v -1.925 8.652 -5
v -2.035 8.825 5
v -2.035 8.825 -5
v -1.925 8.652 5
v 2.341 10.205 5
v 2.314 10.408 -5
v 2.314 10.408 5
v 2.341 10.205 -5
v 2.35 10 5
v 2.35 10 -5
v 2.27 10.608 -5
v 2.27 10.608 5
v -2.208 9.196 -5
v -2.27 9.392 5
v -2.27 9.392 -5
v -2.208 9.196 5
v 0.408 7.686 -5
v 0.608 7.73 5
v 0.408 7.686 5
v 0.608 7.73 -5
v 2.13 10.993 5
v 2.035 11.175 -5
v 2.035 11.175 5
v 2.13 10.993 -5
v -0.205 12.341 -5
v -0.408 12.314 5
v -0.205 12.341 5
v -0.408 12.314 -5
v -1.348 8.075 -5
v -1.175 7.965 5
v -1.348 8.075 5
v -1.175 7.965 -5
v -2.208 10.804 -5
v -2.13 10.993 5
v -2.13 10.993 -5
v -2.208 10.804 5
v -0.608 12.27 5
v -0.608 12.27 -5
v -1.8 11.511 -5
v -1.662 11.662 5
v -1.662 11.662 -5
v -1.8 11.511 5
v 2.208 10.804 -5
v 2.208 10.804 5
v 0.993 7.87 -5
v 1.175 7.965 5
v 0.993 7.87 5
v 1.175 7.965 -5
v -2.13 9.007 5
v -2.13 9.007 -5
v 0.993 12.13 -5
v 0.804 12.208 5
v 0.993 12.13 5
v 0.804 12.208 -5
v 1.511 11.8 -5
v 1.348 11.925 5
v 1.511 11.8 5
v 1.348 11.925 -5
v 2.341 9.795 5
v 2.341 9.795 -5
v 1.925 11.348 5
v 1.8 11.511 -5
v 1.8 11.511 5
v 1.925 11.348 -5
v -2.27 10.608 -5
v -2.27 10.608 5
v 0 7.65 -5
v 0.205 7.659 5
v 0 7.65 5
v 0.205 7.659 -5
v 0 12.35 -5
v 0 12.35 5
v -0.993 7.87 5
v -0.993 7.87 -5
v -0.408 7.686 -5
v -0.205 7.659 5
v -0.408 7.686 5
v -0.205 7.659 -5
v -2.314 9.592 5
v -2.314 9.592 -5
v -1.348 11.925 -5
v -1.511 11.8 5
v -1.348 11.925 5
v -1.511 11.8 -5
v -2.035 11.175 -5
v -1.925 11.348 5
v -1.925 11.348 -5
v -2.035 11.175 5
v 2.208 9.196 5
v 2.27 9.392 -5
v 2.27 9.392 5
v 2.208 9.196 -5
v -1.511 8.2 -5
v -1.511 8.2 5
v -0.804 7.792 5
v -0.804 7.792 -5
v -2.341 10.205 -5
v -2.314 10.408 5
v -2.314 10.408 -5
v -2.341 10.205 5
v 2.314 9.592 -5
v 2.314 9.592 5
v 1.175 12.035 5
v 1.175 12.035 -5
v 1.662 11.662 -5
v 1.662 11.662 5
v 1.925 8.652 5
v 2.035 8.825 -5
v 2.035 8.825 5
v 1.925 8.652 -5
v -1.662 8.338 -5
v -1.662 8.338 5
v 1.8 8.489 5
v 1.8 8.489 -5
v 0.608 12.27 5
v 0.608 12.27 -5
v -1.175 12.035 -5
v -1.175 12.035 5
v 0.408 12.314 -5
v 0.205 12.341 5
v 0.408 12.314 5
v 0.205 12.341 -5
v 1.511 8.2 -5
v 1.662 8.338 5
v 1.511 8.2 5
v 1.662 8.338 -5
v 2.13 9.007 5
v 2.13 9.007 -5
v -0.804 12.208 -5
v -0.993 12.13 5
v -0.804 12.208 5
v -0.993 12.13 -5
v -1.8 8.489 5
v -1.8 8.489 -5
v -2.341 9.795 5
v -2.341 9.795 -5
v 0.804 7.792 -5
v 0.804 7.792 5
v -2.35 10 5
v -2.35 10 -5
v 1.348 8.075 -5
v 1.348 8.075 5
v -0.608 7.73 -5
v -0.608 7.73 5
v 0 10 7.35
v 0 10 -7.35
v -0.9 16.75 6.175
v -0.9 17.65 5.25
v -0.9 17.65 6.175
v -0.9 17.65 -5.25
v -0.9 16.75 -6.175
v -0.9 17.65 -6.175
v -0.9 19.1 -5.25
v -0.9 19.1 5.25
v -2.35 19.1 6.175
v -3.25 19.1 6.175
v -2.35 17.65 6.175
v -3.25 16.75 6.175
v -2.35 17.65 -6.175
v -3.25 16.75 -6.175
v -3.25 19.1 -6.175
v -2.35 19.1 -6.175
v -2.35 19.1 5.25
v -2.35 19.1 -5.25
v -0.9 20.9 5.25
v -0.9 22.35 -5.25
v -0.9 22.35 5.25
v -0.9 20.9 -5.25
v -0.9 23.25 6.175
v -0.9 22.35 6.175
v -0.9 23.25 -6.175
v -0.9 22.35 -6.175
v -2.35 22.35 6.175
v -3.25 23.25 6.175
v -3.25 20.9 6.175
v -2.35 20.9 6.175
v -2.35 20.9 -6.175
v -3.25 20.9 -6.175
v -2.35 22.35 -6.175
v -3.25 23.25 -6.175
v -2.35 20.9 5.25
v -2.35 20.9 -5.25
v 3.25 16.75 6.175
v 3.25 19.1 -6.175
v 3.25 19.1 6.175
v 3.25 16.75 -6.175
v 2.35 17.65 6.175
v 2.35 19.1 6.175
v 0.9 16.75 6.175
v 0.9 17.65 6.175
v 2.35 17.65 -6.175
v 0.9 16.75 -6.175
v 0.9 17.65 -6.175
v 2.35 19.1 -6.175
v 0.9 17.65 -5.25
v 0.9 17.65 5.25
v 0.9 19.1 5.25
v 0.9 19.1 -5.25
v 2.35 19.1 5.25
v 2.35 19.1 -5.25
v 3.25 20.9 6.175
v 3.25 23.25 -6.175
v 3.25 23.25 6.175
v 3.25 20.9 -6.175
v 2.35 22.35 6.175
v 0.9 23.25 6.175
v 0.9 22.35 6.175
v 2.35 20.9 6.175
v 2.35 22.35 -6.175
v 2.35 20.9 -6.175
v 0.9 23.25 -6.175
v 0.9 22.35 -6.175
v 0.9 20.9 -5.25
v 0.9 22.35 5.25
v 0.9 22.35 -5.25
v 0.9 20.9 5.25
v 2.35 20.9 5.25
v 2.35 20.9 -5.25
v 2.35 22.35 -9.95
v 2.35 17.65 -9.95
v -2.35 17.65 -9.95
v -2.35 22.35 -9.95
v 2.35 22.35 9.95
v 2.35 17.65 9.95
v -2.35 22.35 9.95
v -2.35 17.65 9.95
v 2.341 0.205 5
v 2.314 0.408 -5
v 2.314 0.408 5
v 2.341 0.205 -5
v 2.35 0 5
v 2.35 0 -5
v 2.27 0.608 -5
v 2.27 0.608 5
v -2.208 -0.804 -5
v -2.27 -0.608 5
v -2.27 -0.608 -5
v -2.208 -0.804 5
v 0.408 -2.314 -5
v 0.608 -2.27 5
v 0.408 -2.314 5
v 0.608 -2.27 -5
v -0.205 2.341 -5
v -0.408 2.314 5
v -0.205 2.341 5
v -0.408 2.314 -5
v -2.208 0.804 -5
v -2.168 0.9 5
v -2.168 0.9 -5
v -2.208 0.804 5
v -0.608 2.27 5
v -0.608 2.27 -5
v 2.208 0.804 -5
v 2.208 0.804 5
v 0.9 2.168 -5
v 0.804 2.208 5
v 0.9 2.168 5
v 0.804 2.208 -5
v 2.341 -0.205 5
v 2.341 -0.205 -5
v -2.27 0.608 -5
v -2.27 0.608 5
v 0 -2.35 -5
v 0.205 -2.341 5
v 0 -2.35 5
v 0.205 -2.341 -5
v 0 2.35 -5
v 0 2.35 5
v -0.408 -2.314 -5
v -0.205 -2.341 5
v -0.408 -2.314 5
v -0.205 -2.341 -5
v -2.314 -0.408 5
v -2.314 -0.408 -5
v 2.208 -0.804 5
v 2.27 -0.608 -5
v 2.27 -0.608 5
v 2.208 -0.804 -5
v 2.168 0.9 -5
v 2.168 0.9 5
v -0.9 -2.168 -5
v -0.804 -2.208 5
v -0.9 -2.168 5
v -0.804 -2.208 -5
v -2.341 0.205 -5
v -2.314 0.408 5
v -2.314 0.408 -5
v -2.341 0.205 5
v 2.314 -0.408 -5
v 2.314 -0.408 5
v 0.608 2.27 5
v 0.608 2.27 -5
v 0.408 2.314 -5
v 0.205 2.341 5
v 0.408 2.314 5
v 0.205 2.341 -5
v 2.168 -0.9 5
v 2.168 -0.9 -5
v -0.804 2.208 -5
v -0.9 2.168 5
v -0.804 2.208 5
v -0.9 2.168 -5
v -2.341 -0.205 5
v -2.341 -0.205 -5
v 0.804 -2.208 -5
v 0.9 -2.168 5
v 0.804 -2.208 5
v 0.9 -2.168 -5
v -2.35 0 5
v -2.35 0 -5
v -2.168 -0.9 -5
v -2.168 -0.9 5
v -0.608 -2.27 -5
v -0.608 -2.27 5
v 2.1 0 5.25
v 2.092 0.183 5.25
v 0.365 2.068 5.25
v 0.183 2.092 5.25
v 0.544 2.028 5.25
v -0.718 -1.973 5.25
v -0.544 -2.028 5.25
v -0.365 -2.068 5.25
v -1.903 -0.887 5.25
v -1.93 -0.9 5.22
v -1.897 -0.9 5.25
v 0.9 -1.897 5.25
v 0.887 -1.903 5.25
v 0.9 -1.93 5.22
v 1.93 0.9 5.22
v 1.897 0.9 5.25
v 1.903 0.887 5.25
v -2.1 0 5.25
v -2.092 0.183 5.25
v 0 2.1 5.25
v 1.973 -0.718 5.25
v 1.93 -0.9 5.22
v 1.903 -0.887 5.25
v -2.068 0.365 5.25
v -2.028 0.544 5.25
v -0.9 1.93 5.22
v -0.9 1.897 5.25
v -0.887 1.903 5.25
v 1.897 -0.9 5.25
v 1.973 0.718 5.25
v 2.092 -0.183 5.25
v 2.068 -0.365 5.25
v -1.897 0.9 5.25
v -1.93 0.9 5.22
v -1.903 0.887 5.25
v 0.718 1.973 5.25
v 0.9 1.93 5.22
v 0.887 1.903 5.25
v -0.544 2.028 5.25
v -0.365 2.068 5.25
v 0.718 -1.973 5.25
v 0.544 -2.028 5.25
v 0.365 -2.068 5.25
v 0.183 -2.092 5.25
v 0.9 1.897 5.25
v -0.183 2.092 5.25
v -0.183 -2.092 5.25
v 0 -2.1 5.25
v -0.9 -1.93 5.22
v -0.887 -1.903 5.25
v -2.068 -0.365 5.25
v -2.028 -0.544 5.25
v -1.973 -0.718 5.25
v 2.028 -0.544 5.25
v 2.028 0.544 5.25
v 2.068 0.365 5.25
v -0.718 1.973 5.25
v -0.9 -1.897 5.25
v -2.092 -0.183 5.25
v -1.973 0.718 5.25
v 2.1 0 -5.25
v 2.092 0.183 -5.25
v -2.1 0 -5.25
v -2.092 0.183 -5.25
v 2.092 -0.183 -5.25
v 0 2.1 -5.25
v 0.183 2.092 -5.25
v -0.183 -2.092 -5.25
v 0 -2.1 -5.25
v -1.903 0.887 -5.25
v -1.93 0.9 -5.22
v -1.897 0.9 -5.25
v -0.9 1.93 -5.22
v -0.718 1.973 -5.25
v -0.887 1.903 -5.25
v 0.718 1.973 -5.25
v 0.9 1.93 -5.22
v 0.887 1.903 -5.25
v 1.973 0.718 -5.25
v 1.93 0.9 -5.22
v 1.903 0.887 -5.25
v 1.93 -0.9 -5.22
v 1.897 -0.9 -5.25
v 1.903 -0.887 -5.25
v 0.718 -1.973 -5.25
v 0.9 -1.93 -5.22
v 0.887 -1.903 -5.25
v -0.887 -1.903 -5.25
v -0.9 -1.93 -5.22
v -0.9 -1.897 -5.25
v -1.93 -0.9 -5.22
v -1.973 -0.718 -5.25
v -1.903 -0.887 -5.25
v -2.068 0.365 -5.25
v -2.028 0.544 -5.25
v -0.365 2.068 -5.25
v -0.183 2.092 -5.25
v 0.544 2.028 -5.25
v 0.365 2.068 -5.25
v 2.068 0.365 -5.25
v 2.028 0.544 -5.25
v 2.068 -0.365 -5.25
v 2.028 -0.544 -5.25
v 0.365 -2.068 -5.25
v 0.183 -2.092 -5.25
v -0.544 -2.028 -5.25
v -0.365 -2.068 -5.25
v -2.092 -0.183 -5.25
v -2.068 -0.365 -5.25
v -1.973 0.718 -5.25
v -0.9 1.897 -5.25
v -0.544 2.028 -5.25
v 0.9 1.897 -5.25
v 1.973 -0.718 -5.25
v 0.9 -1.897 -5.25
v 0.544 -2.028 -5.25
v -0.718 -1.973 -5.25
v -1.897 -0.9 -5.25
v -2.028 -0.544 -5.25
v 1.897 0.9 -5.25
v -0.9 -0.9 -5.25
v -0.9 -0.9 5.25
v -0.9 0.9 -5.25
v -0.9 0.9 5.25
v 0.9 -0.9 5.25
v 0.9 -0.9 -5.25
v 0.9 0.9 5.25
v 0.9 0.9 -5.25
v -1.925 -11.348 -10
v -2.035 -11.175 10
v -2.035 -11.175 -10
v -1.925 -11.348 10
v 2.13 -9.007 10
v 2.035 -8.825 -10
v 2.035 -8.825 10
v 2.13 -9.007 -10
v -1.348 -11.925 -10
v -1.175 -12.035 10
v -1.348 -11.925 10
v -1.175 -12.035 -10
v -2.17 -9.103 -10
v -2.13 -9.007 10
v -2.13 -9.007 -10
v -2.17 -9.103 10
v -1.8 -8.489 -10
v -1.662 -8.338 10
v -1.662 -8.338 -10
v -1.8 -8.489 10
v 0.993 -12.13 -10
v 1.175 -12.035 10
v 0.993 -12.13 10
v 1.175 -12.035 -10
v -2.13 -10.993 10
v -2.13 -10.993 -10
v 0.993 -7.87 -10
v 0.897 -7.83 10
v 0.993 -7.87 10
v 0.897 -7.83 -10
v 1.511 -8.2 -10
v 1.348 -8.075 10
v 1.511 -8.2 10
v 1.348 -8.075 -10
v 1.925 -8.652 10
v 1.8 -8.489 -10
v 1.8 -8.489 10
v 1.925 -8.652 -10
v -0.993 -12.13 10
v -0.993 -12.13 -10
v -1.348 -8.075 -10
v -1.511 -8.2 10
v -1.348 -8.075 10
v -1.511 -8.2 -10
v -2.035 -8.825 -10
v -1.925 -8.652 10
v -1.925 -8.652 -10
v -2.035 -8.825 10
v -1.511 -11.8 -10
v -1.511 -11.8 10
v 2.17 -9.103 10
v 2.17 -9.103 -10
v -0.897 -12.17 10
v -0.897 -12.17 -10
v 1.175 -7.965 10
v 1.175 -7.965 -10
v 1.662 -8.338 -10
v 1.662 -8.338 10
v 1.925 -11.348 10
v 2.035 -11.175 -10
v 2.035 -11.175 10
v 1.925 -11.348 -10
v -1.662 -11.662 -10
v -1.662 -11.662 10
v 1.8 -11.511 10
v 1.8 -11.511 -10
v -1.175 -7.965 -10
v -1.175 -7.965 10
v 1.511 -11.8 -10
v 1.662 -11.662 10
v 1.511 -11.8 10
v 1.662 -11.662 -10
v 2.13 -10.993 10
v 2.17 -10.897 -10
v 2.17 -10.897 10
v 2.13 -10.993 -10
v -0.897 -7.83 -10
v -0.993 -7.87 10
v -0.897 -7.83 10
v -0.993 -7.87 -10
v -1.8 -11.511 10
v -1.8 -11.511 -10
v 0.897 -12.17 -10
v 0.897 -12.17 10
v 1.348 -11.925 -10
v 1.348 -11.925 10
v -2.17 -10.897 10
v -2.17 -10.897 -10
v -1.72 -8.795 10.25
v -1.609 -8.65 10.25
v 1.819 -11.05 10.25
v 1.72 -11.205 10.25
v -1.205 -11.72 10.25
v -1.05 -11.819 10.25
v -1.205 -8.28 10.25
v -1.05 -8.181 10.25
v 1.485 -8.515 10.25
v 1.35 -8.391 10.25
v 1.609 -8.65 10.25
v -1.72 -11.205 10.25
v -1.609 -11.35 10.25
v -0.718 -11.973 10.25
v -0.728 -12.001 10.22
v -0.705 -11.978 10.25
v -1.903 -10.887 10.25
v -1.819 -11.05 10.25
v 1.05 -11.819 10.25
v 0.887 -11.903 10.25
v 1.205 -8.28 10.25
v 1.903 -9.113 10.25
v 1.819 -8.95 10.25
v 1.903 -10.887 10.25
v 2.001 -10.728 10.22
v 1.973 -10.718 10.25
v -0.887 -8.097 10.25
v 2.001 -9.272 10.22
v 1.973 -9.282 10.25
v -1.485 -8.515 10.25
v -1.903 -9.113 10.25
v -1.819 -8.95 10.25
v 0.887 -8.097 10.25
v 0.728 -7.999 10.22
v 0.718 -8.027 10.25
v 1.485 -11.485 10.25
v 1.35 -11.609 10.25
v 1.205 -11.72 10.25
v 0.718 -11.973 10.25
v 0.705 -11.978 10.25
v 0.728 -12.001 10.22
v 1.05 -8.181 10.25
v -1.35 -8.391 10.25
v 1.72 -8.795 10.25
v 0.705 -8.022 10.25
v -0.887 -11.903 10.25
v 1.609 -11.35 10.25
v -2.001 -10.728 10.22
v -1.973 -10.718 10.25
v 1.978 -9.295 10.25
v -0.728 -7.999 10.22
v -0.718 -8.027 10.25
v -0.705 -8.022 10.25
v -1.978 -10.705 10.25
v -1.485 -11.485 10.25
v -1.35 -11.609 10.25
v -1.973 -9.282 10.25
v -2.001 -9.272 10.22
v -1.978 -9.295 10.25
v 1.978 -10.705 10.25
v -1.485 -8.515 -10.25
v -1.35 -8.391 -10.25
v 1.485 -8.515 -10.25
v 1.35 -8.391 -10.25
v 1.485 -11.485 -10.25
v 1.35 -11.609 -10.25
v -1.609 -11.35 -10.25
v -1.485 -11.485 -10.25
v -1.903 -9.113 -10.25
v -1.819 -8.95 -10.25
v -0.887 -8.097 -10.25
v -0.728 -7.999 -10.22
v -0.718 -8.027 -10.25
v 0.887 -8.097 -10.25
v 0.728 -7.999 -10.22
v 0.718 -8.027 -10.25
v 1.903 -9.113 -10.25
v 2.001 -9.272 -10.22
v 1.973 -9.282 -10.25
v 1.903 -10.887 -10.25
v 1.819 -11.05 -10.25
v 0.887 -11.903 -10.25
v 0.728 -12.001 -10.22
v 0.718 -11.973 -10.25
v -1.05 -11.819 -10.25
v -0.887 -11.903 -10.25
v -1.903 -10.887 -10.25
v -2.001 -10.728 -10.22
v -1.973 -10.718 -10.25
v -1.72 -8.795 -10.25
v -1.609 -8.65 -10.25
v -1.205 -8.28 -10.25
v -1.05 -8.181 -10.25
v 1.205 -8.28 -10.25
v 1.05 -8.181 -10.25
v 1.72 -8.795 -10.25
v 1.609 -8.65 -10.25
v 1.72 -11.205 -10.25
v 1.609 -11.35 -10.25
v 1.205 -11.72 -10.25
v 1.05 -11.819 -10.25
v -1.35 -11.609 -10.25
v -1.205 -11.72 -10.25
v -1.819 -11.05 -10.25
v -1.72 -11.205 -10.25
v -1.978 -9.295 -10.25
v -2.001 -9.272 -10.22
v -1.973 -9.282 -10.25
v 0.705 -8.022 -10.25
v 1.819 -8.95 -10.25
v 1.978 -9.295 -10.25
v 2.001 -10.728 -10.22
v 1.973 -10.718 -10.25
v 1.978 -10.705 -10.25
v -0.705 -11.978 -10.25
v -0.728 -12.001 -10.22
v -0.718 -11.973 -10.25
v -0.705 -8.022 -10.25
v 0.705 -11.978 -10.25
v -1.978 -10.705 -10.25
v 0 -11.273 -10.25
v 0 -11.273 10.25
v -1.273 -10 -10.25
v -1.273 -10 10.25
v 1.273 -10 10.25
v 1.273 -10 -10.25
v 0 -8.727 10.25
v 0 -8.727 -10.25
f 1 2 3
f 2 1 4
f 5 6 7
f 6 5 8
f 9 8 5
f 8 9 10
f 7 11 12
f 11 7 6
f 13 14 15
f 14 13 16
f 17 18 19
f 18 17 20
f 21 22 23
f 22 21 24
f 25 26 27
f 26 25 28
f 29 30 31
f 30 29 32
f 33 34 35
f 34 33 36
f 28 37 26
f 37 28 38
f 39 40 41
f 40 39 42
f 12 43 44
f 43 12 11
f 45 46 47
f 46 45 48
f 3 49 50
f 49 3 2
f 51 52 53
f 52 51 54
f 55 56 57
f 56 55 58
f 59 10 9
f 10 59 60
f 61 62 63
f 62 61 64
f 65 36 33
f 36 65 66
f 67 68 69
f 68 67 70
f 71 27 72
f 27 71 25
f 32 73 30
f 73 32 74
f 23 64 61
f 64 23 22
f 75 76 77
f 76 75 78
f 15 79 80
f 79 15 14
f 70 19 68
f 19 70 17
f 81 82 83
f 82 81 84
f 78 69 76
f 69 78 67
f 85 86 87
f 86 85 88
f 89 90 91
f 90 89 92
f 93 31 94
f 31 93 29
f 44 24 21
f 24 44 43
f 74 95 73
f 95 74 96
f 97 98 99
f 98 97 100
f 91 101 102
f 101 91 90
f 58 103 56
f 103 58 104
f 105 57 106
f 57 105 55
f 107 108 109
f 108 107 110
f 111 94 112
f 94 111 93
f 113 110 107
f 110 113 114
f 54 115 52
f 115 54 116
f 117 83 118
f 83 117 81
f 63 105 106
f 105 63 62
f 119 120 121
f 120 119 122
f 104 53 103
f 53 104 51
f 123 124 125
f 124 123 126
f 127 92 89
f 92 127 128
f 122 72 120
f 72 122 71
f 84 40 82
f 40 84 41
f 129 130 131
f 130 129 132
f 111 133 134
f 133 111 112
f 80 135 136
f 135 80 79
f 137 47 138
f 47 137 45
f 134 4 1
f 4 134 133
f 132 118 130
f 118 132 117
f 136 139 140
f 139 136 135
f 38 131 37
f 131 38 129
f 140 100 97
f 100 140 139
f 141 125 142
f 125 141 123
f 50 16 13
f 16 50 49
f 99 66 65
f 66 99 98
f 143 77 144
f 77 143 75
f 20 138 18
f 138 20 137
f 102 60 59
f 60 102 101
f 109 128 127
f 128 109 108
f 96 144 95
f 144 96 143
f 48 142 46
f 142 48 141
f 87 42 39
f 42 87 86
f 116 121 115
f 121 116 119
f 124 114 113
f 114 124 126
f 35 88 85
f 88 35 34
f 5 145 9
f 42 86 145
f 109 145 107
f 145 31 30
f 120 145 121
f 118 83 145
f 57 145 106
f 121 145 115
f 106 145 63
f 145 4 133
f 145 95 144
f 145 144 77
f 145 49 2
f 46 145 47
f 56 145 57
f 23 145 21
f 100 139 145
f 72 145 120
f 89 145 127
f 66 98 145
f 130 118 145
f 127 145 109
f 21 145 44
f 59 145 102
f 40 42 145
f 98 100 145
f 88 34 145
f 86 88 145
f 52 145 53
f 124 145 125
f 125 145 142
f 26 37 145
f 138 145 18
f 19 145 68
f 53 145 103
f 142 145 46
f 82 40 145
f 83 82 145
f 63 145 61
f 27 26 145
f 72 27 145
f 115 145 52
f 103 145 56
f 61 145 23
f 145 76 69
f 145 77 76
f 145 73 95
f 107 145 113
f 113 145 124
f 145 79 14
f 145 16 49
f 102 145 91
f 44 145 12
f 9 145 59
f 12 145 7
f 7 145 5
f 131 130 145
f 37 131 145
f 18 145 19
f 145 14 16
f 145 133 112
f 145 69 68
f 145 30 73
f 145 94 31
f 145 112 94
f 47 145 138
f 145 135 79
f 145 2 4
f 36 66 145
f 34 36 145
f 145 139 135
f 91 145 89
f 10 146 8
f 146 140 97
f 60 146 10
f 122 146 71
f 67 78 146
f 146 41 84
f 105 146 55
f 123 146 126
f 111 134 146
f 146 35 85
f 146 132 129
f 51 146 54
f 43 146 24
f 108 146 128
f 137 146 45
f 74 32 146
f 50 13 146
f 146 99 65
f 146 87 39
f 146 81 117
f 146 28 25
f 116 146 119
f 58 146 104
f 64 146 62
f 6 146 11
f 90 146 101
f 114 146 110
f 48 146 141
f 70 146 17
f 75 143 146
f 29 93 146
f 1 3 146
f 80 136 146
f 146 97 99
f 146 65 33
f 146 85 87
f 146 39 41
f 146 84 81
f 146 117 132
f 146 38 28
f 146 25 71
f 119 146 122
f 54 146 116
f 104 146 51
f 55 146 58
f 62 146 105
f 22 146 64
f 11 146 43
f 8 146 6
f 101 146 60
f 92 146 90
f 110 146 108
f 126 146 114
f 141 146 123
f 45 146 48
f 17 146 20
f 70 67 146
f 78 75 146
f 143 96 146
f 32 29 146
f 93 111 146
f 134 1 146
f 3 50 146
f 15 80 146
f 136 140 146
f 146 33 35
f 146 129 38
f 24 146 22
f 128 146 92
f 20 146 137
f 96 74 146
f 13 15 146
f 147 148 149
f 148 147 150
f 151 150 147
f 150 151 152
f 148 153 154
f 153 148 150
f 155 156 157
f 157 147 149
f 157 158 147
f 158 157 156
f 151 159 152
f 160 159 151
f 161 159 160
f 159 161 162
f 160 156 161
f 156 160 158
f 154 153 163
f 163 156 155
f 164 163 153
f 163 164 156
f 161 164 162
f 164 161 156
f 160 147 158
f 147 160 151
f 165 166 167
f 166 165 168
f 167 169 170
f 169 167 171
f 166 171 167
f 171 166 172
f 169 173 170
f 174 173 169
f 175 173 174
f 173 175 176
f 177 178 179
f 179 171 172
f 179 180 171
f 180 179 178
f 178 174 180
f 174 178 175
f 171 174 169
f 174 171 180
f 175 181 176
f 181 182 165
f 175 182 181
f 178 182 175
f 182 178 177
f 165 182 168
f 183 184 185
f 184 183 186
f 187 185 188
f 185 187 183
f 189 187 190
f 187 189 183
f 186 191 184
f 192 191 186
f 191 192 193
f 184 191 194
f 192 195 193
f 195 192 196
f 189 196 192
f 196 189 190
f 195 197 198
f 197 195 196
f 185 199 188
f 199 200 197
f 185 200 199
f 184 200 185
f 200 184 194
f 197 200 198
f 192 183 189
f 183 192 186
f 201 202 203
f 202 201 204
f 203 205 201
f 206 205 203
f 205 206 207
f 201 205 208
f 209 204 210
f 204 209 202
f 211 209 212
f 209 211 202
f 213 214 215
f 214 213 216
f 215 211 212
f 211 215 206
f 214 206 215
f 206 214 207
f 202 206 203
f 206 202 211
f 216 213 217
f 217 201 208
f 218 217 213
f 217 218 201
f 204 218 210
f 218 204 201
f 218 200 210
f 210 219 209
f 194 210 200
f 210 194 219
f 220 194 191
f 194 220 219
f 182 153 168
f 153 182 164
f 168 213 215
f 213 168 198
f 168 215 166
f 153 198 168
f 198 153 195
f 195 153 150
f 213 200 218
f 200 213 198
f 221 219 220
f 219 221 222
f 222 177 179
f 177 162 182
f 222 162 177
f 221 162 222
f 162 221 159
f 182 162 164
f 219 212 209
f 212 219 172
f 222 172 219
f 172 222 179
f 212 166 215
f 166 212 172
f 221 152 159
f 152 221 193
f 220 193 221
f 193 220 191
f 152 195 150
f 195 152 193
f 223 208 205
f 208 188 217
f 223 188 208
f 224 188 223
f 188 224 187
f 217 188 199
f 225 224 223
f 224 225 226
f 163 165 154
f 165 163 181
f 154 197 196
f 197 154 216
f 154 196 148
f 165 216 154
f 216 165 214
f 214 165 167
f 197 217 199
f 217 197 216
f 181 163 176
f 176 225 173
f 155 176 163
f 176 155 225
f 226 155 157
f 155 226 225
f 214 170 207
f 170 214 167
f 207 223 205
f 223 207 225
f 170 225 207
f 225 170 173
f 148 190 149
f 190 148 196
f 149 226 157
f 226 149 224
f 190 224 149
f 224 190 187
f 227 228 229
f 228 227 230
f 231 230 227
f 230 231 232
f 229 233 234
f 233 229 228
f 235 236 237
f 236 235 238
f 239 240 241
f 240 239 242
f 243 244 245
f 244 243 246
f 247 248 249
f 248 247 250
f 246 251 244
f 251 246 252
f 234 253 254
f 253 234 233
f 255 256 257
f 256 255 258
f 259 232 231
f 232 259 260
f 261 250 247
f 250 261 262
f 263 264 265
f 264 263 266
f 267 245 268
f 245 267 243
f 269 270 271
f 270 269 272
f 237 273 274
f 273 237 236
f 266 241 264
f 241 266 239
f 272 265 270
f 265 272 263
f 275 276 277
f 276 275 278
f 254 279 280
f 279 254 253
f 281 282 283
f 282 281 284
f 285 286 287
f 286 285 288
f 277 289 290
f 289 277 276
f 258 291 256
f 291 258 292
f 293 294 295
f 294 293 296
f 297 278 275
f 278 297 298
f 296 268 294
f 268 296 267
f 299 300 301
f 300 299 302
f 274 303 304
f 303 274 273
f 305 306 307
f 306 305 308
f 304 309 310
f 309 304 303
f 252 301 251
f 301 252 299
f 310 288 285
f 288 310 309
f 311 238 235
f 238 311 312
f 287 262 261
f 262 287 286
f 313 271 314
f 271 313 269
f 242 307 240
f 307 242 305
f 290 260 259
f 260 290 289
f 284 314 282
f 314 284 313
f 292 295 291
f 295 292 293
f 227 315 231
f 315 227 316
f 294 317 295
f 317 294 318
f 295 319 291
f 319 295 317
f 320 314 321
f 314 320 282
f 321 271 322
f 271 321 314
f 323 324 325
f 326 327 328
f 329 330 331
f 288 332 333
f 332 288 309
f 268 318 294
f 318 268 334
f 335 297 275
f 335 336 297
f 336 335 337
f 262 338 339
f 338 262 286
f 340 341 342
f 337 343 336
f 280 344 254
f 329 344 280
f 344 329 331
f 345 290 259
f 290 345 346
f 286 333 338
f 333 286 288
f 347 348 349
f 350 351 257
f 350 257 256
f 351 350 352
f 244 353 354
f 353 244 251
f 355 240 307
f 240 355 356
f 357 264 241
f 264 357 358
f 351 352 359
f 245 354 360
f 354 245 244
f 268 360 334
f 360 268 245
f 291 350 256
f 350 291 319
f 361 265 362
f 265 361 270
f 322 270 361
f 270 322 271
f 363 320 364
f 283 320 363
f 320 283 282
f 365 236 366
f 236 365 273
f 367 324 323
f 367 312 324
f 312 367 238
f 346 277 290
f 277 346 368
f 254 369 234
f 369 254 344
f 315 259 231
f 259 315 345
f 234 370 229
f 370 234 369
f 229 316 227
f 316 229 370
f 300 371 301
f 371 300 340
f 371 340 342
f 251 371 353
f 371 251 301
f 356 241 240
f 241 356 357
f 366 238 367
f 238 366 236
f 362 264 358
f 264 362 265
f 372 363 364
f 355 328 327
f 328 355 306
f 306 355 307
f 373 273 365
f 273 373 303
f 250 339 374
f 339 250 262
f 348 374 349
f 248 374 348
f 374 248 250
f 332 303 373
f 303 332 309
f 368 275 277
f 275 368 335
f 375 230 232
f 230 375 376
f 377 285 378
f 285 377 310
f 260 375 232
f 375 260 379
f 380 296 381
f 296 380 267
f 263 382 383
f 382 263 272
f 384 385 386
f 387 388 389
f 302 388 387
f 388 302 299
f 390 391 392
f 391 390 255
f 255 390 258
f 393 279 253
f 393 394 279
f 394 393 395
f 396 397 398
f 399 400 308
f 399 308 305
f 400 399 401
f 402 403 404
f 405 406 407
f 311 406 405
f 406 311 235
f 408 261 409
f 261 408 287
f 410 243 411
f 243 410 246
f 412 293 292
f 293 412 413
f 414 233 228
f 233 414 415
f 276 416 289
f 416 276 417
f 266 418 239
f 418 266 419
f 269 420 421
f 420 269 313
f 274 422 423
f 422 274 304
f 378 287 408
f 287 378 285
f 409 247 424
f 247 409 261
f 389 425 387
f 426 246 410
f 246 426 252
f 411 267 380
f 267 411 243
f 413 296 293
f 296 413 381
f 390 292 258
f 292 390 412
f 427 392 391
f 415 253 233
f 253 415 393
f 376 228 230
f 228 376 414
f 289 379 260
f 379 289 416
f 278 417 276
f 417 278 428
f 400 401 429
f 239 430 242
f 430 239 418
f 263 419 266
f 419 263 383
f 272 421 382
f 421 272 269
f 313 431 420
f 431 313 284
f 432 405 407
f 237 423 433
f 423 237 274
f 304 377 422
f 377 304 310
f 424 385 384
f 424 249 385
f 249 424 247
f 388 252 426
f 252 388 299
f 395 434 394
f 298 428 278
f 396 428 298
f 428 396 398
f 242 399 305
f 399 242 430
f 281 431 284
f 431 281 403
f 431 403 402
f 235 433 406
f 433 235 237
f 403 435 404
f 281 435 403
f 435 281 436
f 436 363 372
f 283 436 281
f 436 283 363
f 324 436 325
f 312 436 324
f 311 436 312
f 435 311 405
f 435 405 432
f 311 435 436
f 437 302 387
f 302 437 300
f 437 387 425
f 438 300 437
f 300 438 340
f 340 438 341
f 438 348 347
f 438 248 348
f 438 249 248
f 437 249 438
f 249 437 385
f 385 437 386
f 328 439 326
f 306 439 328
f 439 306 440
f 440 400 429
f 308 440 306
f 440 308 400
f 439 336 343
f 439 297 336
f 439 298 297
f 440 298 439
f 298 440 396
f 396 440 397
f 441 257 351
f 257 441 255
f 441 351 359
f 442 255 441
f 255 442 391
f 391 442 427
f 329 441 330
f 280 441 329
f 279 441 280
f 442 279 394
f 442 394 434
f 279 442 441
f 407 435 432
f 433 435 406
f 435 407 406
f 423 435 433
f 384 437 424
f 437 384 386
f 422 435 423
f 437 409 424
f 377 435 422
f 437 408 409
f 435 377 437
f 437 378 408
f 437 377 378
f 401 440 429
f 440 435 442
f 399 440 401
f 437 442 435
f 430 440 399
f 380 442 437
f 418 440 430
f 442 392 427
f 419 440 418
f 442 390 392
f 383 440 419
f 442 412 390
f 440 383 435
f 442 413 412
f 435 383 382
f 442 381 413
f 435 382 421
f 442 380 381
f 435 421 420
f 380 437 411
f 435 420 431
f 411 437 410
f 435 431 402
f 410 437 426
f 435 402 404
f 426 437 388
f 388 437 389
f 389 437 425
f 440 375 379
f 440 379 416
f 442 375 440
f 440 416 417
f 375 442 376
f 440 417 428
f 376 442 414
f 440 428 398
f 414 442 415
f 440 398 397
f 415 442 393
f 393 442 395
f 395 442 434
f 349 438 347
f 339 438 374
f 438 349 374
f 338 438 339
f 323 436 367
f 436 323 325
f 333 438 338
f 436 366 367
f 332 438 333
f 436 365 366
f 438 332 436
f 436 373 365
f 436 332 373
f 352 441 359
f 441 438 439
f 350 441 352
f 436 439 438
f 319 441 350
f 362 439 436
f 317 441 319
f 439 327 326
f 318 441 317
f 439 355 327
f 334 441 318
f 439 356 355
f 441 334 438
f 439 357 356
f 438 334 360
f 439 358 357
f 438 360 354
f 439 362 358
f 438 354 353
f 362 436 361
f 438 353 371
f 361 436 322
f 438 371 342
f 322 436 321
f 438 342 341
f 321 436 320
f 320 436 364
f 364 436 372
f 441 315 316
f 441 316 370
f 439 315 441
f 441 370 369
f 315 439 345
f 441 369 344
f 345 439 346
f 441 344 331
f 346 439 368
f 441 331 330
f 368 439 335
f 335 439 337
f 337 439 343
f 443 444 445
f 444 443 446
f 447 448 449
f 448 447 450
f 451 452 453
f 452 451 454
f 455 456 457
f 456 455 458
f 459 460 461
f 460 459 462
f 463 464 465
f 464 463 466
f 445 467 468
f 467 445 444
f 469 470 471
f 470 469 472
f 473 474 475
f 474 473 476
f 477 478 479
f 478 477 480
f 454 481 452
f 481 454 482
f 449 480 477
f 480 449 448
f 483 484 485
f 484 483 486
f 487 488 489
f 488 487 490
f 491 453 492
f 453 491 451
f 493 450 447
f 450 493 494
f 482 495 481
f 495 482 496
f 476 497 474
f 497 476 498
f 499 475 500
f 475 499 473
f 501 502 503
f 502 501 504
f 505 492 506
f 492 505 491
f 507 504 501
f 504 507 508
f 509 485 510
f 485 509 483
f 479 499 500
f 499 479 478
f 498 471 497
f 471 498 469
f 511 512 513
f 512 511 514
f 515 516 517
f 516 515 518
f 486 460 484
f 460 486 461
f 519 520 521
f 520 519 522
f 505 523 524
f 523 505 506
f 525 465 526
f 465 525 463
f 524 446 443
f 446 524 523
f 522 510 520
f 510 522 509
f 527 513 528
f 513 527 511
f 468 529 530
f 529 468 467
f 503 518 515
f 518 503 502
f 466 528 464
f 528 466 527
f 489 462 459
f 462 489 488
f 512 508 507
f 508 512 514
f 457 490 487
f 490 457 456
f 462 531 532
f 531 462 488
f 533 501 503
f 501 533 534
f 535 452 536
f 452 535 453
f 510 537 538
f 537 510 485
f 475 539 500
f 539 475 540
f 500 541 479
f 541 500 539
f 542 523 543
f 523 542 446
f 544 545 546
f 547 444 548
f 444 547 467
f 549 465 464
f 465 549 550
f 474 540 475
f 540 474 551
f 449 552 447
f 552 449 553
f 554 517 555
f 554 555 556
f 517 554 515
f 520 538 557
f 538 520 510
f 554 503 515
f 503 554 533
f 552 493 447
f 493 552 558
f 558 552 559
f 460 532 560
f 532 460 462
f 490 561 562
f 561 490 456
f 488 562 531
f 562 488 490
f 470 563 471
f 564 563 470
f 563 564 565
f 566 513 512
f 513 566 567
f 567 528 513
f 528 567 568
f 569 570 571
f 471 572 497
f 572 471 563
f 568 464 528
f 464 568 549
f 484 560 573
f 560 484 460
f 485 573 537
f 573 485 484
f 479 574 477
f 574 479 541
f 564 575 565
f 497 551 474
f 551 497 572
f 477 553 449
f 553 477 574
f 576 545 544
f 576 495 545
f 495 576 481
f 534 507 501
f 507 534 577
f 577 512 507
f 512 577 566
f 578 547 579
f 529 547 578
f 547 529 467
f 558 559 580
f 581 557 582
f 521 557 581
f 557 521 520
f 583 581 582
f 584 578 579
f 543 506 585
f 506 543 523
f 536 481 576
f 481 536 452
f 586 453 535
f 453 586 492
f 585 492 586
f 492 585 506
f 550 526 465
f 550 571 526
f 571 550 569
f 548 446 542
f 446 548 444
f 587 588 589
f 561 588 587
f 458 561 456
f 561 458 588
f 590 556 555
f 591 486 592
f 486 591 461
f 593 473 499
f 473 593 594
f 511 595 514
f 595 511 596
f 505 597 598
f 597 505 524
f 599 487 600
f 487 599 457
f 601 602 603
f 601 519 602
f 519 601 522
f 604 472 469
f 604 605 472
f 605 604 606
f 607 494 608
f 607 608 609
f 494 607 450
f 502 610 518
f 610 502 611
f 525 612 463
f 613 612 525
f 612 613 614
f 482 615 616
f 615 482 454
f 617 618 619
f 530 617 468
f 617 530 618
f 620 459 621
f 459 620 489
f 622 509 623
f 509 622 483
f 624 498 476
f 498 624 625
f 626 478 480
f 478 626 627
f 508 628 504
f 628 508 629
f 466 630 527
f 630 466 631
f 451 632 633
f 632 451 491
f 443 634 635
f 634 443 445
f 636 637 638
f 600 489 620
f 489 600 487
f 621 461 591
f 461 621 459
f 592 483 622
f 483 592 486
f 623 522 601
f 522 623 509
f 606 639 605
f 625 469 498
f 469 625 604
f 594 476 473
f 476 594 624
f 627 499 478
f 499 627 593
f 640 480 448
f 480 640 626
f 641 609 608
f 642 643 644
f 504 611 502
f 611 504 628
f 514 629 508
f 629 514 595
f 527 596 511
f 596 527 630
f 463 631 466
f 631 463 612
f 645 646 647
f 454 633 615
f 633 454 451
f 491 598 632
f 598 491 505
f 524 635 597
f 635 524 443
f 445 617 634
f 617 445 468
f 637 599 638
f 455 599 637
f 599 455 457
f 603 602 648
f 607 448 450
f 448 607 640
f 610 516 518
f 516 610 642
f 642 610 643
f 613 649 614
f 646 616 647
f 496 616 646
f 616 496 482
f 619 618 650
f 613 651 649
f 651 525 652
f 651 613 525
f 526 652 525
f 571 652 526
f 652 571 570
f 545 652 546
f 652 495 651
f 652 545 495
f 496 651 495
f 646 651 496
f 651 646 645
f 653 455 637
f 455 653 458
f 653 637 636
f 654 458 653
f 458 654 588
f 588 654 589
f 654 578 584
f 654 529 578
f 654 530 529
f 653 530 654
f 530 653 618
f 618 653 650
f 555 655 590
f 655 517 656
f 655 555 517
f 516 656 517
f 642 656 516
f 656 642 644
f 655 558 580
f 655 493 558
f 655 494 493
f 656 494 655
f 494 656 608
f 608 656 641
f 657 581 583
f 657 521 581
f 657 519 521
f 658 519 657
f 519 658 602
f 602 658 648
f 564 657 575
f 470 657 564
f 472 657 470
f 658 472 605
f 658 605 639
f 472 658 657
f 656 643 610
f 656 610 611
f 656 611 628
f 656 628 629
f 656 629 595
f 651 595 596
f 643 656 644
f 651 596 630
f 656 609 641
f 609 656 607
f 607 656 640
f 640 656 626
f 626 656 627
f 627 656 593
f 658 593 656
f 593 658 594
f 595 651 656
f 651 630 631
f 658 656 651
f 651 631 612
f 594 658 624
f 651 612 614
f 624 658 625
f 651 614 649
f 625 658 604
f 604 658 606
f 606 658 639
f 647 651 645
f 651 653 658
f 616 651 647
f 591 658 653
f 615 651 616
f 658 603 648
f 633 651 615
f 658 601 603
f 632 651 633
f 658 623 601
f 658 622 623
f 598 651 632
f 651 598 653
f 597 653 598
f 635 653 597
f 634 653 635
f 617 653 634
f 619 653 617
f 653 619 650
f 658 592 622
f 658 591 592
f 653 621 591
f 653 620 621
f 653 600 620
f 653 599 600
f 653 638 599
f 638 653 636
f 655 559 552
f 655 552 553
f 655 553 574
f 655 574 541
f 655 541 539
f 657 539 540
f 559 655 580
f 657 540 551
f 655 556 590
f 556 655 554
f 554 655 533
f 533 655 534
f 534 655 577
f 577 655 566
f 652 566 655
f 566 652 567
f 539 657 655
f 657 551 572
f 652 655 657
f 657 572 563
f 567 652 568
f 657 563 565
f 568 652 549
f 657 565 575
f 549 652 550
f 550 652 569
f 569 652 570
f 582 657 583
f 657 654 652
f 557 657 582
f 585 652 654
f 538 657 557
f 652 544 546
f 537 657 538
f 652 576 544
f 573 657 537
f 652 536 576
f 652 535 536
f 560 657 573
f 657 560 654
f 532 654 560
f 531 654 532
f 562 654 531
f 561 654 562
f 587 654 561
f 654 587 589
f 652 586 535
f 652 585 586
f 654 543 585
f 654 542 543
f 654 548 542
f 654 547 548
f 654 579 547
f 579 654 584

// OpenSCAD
// file: ../../globals/ObtGlobalConst.scad
// Global resolution
$fs = 0.1;	// Don't generate smaller facets than 0.1 mm
$fa = 5;		// Don't generate larger angles than 5 degrees

// Brick dimensions
OBT_GLOBAL_BAR_WIDTH = 7.2;
OBT_GLOBAL_BAR_HEIGHT = 7.6;

OBT_GLOBAL_HOLE_DIAMETER = 4.8;
OBT_GLOBAL_HOLE_CHAMFER_DIAMETER = 6.2;
OBT_GLOBAL_HOLE_CHAMFER_HEIGHT = 0.7;
OBT_GLOBAL_HOLE_DISTANCE = 12.9 - OBT_GLOBAL_HOLE_DIAMETER;
// file: ObtAxConst.scad
include <../../globals/ObtGlobalConst.scad>

// Axles dimensions
OBT_AX_DIAMETER = 4.7;
OBT_AX_BASE_LENGTH = 10;
// main file
include <ObtAxConst.scad>

module obtAxStdBase(length){
	union(){
		coneHeight = 0.5 * OBT_AX_DIAMETER;
		coneOffset = 0.5 * (length * OBT_AX_BASE_LENGTH + coneHeight);
		cylinder(length * OBT_AX_BASE_LENGTH, d1 = OBT_AX_DIAMETER, d2 = OBT_AX_DIAMETER, center = true);
		translate([0, 0, +coneOffset]) cylinder(coneHeight, d1 = OBT_AX_DIAMETER, d2 = 0, center = true);
		translate([0, 0, -coneOffset]) cylinder(coneHeight, d1 = 0, d2 = OBT_AX_DIAMETER, center = true);
	}
}

module obtAxStdDiff(length){
	cubeWidth = 0.5 * OBT_AX_DIAMETER;
	crossWidth = 1.8;
	crossOffset = 1 * (cubeWidth + crossWidth);
	offsetChamferCube = length * OBT_AX_BASE_LENGTH + 1 * OBT_AX_DIAMETER + 0.5;
	for(i = [0 : 1 : 1]){
		for(j = [0 : 1 : 1])
			translate([crossOffset * (i - 0.5) , crossOffset * (j - 0.5), 0]) cube([cubeWidth, cubeWidth, length * (OBT_AX_BASE_LENGTH + 0.5 * OBT_AX_DIAMETER)] , center = true);
		translate([0, 0, offsetChamferCube * (i - 0.5)]) cube(OBT_AX_DIAMETER, center = true);
	}
}

module obtAxStd(length = 1, color = "lightgrey", rotation = 0){
	color(color)
		difference(){
			obtAxStdBase(length);
			rotate([0, 0, rotation]) obtAxStdDiff(length);
		}
}


// Test
length = 1;
translate([0,  10, 0]) color("green") obtAxStdBase(length);
translate([0,  20, 0]) color("red") obtAxStdDiff(length);
translate([0,   0, 0]) obtAxStd(length);
translate([0, -10, 0]) obtAxStd(length = 2, color = "khaki", rotation = 45);
